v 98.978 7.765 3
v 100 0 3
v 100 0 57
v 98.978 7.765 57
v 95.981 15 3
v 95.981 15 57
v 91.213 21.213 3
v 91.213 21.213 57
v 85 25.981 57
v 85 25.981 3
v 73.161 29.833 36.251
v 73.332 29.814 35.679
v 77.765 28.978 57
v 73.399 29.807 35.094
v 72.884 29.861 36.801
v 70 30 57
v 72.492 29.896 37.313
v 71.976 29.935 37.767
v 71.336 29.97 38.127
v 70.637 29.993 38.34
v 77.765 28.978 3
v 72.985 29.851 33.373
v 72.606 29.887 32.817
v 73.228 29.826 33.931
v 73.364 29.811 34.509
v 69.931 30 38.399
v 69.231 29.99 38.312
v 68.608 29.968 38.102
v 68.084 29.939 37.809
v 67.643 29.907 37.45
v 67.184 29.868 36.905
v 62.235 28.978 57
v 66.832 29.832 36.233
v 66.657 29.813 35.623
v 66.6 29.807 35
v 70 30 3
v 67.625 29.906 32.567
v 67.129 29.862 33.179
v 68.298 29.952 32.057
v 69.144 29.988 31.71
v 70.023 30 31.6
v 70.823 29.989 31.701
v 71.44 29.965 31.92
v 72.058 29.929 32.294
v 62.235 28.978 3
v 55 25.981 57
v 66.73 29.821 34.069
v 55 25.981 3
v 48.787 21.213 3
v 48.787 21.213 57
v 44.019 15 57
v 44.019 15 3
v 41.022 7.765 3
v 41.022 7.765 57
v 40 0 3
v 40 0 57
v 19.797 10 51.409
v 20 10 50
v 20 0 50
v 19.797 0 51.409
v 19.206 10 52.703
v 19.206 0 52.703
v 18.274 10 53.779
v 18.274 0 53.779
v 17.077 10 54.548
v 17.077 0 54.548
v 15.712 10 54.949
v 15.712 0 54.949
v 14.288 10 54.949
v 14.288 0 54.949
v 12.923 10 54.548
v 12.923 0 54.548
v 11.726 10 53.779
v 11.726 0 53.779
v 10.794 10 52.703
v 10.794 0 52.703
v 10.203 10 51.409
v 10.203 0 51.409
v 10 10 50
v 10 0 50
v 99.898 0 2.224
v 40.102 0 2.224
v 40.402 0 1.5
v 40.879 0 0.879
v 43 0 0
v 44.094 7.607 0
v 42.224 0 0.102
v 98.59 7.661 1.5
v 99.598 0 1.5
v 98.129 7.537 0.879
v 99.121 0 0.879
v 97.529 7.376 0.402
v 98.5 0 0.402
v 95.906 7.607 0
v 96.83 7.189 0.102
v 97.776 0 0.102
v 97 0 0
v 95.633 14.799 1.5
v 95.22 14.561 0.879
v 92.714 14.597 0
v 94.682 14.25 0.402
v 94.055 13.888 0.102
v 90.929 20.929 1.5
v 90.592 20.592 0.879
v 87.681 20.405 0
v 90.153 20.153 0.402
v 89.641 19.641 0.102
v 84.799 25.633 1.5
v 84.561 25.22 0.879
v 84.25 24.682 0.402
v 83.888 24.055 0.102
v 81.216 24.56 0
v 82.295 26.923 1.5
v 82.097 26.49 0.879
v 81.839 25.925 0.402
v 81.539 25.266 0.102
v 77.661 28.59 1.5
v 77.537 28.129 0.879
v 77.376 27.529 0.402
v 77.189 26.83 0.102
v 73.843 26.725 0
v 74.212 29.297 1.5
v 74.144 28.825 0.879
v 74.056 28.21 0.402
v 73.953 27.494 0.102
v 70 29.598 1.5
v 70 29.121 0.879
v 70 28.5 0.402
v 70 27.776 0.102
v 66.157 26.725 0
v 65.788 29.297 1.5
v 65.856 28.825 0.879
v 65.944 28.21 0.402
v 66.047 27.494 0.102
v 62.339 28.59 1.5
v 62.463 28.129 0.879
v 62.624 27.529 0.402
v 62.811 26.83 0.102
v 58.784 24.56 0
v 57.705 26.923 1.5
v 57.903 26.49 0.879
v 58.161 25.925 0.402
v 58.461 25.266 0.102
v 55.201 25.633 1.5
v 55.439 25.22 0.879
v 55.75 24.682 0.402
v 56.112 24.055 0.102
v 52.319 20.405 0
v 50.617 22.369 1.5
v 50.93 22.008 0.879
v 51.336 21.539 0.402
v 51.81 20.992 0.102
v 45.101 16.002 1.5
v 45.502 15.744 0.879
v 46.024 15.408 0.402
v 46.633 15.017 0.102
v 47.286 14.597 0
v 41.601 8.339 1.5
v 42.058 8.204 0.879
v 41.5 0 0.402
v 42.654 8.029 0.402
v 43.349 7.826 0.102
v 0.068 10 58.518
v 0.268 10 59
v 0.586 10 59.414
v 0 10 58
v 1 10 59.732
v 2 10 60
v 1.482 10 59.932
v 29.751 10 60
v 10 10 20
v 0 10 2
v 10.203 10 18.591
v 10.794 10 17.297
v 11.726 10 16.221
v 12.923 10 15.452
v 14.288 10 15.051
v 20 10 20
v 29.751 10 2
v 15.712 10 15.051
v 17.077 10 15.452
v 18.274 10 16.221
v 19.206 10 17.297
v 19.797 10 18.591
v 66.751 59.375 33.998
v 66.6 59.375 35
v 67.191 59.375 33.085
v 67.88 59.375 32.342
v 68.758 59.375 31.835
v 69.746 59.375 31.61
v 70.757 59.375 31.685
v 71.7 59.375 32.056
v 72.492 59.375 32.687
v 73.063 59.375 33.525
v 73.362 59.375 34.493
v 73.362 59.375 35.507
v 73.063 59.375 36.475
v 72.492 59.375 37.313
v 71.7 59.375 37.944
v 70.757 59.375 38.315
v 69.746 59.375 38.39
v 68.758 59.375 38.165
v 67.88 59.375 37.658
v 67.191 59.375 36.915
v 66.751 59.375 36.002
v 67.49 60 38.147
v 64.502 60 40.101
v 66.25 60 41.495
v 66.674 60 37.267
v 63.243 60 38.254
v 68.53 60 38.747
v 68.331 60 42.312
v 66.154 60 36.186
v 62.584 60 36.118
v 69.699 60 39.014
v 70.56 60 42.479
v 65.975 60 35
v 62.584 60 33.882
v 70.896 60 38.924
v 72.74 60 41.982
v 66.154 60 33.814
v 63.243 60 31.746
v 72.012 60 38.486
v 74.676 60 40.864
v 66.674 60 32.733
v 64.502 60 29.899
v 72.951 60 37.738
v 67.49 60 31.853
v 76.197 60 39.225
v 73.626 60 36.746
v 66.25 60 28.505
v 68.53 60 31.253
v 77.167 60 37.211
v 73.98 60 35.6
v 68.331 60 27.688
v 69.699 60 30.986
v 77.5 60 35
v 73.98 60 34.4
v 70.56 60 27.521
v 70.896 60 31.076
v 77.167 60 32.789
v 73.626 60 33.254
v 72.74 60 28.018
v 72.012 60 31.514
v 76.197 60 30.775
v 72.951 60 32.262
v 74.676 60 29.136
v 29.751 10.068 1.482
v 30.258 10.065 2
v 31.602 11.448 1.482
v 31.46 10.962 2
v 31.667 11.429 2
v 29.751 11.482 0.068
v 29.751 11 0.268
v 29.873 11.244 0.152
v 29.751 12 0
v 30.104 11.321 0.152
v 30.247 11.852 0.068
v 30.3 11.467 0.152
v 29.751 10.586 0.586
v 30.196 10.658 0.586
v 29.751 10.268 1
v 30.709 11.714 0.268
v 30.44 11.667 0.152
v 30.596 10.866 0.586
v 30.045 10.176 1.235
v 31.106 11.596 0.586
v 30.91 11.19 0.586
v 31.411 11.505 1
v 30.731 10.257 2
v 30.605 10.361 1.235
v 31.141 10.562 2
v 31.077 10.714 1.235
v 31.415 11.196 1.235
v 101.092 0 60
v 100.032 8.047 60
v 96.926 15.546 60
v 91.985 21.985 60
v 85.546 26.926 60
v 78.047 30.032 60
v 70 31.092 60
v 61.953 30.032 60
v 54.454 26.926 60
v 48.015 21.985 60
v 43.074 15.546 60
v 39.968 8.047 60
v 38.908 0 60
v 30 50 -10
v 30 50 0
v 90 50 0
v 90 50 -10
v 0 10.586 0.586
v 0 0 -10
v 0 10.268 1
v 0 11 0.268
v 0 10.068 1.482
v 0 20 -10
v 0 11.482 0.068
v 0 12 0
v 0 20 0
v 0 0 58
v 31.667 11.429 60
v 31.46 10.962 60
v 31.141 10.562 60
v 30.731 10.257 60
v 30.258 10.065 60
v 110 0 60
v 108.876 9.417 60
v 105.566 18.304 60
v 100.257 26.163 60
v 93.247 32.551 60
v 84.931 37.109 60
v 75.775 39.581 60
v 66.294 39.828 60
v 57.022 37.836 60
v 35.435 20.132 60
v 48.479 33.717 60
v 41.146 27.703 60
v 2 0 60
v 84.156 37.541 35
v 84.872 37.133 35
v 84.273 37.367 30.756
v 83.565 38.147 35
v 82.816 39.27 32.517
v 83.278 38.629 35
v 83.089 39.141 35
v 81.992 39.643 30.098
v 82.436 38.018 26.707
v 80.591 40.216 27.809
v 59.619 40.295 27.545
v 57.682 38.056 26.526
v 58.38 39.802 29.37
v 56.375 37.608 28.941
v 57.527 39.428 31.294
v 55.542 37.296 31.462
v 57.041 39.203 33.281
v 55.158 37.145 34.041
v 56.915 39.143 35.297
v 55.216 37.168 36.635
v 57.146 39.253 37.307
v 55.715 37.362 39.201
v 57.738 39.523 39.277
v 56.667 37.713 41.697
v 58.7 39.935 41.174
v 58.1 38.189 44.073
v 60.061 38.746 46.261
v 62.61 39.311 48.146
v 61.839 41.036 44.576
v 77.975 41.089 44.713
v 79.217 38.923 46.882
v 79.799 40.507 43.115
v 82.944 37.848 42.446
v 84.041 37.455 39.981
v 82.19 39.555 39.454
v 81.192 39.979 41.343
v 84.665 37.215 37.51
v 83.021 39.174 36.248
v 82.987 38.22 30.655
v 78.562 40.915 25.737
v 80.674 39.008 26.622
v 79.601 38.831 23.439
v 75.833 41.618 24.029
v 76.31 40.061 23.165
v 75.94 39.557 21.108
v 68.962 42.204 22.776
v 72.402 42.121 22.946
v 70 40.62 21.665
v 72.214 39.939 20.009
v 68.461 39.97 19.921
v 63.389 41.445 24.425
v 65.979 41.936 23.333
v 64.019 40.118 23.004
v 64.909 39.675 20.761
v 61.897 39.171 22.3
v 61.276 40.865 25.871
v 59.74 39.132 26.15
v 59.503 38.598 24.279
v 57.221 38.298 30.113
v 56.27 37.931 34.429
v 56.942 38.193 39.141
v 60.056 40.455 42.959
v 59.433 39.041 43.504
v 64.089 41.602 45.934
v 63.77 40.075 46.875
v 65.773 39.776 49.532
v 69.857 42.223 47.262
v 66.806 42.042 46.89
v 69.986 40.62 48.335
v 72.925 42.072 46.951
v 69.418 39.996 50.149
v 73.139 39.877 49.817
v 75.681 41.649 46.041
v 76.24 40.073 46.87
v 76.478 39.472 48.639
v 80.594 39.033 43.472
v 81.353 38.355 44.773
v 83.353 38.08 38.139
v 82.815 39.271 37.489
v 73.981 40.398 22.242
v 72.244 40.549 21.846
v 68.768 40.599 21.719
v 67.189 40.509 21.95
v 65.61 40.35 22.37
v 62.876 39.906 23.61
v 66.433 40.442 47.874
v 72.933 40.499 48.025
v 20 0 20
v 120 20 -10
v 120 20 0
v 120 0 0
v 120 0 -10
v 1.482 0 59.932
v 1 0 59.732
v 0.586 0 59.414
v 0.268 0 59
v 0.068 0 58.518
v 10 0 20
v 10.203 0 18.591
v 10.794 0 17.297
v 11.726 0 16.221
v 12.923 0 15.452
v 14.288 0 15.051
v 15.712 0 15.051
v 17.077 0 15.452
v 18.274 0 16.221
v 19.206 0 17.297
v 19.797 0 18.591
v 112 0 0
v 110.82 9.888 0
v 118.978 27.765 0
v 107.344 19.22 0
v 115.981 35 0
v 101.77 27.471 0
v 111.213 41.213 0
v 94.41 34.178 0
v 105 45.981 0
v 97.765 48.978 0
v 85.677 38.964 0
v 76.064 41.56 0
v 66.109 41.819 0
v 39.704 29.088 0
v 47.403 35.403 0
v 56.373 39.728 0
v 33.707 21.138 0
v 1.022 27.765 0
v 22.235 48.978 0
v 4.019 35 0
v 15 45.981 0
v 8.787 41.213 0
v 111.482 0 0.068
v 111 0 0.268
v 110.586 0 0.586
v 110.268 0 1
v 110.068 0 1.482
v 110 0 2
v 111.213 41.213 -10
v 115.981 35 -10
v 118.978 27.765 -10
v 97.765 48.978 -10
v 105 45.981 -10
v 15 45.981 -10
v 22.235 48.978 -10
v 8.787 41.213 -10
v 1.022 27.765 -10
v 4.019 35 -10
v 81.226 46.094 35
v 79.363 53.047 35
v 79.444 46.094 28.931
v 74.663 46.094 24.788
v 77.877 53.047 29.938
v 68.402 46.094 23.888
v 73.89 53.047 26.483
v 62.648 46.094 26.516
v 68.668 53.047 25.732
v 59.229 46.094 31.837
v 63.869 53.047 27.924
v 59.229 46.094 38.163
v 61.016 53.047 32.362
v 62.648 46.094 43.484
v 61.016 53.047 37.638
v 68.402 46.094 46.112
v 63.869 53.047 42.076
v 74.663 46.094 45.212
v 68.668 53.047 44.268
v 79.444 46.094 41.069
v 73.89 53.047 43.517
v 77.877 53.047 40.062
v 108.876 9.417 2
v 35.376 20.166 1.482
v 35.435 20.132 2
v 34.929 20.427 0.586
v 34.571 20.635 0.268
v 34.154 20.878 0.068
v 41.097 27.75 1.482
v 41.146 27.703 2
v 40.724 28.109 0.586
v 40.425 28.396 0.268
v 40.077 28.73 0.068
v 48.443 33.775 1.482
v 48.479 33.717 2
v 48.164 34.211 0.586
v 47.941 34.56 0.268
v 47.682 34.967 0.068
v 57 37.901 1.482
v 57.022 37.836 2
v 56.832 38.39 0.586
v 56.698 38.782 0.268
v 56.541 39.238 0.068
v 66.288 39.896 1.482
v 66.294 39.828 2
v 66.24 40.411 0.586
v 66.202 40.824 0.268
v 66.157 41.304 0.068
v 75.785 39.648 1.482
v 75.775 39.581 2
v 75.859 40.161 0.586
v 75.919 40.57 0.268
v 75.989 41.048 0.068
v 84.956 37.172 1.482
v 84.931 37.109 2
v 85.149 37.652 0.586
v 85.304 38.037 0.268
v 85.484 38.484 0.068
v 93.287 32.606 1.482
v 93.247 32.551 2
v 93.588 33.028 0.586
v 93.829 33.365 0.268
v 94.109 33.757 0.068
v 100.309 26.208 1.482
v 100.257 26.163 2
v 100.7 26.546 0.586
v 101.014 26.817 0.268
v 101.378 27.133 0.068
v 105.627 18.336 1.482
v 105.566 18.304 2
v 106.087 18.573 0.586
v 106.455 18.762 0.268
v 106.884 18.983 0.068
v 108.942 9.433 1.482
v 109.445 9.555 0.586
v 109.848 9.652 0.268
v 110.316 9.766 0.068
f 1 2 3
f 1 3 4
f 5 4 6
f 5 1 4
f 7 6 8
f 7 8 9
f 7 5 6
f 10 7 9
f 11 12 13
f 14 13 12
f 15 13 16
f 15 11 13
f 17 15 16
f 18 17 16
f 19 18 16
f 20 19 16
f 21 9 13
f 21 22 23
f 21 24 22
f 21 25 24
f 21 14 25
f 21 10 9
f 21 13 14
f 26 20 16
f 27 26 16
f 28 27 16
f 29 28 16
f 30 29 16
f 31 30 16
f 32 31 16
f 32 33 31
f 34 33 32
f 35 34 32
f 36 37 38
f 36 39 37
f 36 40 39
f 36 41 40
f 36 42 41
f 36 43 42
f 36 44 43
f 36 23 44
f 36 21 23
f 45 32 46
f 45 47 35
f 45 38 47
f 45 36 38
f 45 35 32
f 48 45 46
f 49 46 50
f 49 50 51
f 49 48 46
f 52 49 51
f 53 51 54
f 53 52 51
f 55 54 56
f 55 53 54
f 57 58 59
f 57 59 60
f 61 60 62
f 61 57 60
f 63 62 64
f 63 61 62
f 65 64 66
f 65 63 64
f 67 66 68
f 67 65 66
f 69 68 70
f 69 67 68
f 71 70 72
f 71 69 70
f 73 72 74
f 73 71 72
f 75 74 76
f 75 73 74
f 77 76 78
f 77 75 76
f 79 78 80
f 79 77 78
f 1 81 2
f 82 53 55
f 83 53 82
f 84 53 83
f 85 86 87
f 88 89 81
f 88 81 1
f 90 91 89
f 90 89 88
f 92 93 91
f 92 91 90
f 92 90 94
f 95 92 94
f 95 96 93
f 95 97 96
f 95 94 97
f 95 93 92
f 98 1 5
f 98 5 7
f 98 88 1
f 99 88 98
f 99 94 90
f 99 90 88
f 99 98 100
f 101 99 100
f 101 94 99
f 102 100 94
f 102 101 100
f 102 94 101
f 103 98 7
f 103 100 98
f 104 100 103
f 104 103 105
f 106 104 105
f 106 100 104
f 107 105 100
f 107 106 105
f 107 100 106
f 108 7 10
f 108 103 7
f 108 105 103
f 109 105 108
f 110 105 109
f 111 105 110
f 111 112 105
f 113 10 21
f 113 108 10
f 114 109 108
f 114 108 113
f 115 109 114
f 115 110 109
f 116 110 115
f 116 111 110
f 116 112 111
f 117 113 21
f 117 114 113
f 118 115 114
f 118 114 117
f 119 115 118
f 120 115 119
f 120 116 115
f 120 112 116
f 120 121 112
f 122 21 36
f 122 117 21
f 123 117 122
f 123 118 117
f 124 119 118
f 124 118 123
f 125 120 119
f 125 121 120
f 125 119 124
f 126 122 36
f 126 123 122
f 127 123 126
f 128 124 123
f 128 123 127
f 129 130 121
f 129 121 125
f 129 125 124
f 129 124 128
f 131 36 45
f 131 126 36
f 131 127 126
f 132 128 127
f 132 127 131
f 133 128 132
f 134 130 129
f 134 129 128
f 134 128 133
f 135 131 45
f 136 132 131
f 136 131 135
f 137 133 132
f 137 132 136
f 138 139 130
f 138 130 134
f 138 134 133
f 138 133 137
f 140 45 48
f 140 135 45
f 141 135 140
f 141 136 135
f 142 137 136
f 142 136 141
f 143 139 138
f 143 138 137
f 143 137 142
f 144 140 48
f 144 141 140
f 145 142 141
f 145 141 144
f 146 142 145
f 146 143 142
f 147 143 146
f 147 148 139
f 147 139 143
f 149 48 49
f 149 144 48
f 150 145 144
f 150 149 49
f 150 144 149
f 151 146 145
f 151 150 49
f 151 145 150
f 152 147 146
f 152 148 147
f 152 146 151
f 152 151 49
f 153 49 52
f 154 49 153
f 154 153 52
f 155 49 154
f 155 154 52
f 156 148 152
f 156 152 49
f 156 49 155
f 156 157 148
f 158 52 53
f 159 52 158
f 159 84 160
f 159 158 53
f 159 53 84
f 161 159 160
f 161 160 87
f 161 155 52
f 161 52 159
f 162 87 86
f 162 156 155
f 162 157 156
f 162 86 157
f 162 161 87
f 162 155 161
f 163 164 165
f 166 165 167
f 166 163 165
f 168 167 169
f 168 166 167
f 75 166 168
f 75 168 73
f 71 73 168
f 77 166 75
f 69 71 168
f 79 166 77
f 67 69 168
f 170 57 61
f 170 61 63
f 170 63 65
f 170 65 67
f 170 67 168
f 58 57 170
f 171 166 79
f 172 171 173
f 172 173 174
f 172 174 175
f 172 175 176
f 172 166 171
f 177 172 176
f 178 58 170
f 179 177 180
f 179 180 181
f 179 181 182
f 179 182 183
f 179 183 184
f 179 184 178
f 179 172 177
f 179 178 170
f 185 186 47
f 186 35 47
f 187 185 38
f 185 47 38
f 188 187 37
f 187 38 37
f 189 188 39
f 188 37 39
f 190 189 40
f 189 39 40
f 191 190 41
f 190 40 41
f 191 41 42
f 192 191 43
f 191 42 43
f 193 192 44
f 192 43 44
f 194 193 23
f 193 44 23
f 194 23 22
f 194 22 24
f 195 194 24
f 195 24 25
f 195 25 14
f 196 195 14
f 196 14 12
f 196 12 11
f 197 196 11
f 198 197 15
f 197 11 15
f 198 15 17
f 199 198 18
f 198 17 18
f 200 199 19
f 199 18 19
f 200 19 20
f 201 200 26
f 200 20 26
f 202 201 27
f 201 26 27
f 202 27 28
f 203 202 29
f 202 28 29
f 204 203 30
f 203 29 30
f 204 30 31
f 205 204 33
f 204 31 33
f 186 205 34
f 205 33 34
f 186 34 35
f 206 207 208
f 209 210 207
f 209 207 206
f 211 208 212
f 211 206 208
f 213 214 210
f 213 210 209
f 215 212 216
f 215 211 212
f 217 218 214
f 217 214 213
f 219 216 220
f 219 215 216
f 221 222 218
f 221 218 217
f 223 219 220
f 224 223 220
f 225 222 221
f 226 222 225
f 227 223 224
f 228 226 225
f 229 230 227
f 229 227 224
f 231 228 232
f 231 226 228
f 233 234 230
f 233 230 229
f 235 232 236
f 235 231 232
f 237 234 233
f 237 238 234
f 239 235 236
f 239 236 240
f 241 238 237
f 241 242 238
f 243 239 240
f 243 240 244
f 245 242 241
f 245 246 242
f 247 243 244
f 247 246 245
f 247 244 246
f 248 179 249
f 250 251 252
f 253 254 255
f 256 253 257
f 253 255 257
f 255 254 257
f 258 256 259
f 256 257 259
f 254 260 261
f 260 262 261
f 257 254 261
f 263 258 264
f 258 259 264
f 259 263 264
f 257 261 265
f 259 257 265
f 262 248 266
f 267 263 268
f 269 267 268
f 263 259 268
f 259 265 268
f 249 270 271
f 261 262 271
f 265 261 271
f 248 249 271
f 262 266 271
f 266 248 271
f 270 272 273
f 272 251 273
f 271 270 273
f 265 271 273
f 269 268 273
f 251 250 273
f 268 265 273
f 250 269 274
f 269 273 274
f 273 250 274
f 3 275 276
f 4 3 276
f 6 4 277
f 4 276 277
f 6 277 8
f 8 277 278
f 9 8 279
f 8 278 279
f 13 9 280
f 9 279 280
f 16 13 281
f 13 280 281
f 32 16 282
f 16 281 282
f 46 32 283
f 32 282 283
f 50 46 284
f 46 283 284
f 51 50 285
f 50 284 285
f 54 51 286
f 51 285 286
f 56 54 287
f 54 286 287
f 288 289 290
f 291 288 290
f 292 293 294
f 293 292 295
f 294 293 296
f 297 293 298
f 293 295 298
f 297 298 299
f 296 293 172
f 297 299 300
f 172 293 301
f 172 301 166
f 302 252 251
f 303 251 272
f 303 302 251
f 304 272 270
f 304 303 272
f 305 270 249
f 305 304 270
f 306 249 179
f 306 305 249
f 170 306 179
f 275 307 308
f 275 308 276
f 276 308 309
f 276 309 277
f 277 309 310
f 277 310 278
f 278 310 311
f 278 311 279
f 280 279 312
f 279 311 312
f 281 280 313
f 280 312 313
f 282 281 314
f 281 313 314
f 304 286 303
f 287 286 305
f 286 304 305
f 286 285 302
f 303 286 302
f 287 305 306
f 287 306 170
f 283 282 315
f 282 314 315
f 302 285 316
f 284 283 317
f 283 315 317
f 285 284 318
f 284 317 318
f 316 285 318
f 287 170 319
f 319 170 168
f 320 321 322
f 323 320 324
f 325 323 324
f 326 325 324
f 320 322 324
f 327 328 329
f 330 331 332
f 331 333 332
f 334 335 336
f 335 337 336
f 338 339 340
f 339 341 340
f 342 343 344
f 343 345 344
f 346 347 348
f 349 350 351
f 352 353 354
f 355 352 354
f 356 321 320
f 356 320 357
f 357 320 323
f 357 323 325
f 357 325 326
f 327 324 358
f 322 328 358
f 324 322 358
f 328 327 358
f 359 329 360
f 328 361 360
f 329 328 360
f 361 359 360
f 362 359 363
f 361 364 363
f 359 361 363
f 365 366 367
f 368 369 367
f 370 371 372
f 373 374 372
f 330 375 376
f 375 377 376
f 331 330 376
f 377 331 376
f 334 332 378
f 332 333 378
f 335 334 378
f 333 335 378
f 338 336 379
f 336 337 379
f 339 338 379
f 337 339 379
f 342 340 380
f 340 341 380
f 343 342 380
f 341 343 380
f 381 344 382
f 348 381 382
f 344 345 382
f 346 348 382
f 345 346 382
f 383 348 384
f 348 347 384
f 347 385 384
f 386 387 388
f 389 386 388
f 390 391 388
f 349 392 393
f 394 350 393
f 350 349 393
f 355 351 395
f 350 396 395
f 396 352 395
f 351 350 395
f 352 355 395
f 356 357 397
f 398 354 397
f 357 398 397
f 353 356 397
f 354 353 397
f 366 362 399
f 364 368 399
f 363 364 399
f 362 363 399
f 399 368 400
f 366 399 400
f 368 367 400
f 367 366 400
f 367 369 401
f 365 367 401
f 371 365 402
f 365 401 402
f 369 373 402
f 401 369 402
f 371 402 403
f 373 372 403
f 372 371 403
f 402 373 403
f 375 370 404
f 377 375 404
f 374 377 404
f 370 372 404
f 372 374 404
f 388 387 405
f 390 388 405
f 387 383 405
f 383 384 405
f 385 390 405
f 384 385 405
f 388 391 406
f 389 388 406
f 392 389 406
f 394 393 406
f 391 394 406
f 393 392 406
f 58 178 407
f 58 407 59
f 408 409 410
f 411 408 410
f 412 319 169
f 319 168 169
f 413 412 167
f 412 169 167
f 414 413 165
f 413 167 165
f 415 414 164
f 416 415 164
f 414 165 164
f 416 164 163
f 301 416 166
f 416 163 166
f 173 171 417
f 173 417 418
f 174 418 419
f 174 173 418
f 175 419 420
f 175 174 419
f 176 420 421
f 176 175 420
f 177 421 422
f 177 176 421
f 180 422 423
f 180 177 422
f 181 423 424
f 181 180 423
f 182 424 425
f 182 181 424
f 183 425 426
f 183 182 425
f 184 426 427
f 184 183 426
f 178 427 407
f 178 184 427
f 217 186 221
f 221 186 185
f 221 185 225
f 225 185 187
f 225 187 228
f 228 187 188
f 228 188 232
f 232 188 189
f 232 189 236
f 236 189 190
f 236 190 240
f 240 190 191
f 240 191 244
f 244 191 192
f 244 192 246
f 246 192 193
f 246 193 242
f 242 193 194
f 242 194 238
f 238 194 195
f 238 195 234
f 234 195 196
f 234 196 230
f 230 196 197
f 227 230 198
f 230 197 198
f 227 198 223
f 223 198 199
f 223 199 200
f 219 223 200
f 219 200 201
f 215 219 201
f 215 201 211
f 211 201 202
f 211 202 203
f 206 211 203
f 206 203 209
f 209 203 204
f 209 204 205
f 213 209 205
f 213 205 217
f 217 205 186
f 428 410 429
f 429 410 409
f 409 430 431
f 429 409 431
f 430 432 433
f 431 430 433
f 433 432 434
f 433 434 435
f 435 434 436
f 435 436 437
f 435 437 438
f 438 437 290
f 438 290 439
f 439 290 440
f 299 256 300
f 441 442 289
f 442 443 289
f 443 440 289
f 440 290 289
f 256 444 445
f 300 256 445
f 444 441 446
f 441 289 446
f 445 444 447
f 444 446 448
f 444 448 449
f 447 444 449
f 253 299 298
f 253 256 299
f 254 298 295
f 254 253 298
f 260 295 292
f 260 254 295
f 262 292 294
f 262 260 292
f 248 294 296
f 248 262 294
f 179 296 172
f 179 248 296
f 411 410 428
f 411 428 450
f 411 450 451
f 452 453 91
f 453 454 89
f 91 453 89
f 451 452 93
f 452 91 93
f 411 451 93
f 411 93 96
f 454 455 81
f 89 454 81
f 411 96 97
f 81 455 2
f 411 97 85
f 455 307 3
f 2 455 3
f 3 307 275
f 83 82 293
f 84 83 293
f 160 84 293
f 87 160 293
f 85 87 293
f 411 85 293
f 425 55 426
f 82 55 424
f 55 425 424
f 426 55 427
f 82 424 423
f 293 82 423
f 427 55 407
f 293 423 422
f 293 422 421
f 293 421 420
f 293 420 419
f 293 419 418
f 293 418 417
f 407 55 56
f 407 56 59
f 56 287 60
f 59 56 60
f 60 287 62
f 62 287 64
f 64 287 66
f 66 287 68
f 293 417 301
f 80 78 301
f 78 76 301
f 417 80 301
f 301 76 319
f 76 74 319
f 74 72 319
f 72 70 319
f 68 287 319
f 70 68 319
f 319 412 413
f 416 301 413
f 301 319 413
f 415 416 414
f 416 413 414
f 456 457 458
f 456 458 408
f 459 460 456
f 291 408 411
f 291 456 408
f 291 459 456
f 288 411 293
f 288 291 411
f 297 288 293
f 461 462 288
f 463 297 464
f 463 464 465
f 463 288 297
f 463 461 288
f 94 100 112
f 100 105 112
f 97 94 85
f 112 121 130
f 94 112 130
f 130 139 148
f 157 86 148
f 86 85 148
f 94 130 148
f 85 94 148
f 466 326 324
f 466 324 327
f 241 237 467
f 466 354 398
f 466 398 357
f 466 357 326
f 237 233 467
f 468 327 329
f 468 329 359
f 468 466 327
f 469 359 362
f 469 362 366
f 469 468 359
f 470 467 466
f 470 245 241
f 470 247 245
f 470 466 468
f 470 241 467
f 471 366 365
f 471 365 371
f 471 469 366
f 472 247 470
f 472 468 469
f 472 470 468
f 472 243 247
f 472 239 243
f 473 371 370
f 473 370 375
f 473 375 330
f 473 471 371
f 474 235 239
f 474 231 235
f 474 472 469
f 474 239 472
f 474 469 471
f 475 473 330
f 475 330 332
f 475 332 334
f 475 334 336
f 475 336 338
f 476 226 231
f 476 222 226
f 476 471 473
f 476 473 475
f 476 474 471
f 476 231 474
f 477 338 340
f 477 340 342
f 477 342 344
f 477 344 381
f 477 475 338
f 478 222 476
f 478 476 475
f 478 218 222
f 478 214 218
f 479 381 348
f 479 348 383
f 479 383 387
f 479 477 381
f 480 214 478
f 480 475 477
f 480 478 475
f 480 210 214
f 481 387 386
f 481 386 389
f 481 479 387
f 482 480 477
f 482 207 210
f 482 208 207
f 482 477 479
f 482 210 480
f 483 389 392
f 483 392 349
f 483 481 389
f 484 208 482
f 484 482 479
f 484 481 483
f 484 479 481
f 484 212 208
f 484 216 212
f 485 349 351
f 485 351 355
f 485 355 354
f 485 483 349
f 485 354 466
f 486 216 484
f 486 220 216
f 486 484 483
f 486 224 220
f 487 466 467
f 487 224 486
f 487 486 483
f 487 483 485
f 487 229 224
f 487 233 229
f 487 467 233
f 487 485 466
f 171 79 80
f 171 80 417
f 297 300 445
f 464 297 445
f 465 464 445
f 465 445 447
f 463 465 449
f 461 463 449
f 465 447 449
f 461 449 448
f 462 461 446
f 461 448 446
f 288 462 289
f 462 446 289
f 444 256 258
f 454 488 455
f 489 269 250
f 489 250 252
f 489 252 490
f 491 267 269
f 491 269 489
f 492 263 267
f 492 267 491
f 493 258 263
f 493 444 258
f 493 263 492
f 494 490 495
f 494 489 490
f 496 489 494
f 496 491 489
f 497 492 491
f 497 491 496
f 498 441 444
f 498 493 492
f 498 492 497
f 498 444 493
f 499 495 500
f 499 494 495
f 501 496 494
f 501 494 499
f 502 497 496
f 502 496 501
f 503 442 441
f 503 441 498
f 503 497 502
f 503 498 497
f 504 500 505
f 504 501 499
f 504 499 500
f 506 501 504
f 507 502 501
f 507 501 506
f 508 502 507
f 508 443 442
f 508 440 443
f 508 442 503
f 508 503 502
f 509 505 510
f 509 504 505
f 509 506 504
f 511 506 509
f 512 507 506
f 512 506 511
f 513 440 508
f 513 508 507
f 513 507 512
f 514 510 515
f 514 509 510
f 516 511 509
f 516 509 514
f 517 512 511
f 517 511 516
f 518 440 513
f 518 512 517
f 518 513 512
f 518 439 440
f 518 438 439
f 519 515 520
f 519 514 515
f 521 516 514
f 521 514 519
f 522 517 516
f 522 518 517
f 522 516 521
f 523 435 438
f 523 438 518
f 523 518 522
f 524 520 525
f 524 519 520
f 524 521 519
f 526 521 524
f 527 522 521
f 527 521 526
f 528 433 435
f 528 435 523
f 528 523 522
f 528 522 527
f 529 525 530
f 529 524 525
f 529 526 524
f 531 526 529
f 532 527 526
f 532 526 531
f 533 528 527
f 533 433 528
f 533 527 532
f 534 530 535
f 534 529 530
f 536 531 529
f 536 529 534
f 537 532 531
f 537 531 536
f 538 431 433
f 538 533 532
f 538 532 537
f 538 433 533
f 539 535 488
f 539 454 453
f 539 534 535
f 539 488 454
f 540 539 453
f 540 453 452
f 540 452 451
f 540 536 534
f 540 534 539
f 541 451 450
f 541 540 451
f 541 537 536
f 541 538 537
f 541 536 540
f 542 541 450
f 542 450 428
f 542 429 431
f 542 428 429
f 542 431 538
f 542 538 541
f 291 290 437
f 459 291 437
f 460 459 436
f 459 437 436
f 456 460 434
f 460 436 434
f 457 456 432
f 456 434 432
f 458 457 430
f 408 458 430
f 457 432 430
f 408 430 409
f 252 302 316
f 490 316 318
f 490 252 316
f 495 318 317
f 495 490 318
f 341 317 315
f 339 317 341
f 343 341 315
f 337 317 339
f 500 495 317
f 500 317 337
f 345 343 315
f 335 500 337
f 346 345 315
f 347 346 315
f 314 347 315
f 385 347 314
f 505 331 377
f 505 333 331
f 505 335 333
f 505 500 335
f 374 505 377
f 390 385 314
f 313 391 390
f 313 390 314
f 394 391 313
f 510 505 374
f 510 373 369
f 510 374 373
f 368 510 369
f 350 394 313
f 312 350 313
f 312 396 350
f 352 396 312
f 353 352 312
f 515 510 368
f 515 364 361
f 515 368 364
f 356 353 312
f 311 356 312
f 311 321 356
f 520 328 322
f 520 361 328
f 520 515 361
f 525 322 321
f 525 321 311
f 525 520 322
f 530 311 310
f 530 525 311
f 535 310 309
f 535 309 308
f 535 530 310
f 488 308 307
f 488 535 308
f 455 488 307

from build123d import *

# Parameters (mm, degrees)
P_IDAT_VYSUNUT_M1_DEPTH  = 60
ODEBRAT_VYSUNUT_M1_REACH = 130.841
P_IDAT_VYSUNUT_M2_DEPTH  = 10
M8_Z_VIT1_D              = 6.8
M8_Z_VIT1_CSINK_D        = 8.05
M8_Z_VIT1_CSINK_ANGLE    = 90
ZAOBLIT1_R               = 2
ZAOBLIT2_R               = 3
ZKOSEN_1_SIZE            = 3
ZKOSEN_1_SIZE2           = 1.091910703


# Read off the part's stored shape, not the designer's step: Přidat vysunutím3
with BuildPart() as part:
    # Skica1 → Přidat vysunutím1 (new body)
    with BuildSketch(Plane.XY):
        with BuildLine():
            Line((0, 0), (0, 10))
            Line((0, 10), (31.270166538, 10))
            ThreePointArc((31.270166538, 10), (75.040171699, 39.681187851), (110, 0))
            Line((110, 0), (100, 0))
            ThreePointArc((100, 0), (70, 30), (40, 0))
            Line((40, 0), (0, 0))
        make_face()
    extrude(amount=P_IDAT_VYSUNUT_M1_DEPTH)

    # Skica2 → Odebrat vysunutím1 (cut, up to next)
    with BuildSketch(Plane(origin=(0, 10, 0), x_dir=(1, 0, 0), z_dir=(0, 1, 0)), mode=Mode.PRIVATE) as odebrat_vysunut_m1_sk1:
        with BuildLine():
            Line((20, -20), (20, -50))
            ThreePointArc((20, -50), (15, -55), (10, -50))
            Line((10, -50), (10, -20))
            ThreePointArc((10, -20), (15, -15), (20, -20))
        make_face()
    odebrat_vysunut_m1_tool1 = extrude(odebrat_vysunut_m1_sk1.sketch, amount=-ODEBRAT_VYSUNUT_M1_REACH, mode=Mode.PRIVATE) & part.part
    add(odebrat_vysunut_m1_tool1.solids().sort_by_distance((15, 10, 35))[0], mode=Mode.SUBTRACT)

    # Skica3 → Přidat vysunutím2 (add)
    with BuildSketch(Plane(origin=(0, 0, 0), x_dir=(-1, 0, 0), z_dir=(0, 0, -1))):
        with BuildLine():
            Line((0, 0), (0, 20))
            ThreePointArc((0, 20), (-8.786796564, 41.213203436), (-30, 50))
            Line((-30, 50), (-90, 50))
            ThreePointArc((-90, 50), (-111.213203436, 41.213203436), (-120, 20))
            Line((-120, 20), (-120, 0))
            Line((-120, 0), (0, 0))
        make_face()
    extrude(amount=P_IDAT_VYSUNUT_M2_DEPTH)

    # Přidat vysunutím3 outline → Přidat vysunutím3 (revolve)
    with BuildSketch(Plane(origin=(70, 0, 35), x_dir=(1, 0, 0), z_dir=(0, 0, 1))):
        Polygon((7.5, 60), (0, 60), (0, 37.657552573), (13.486640745, 37.657552573), align=None)
    revolve(axis=Axis((70, 0, 35), (0, 1, 0)))

    # M8 závit1 (through all)
    with Locations(Plane(origin=(0, 60, 0), x_dir=(1, 0, 0), z_dir=(0, 1, 0))):
        with Locations((70, -35)):
            CounterSinkHole(M8_Z_VIT1_D / 2, M8_Z_VIT1_CSINK_D / 2, counter_sink_angle=M8_Z_VIT1_CSINK_ANGLE)

    # Zaoblit1
    zaoblit1_edges = [part.edges().sort_by_distance(p)[0] for p in [
        (31.270166538, 10, 30),
        (0, 5, 60),
        (15.635083269, 10, 0),
        (75.040171699, 39.681187851, 0),
    ]]
    fillet(zaoblit1_edges, radius=ZAOBLIT1_R)

    # Zaoblit2
    zaoblit2_edges = [part.edges().sort_by_distance(p)[0] for p in [
        (56.513435034, 37.657835378, 35.000000009),
        (70, 30, 0),
    ]]
    fillet(zaoblit2_edges, radius=ZAOBLIT2_R)

    # Zkosení1
    zkosen_1_edges = [part.edges().sort_by_distance(p)[0] for p in [
        (70, 30, 60),
    ]]
    zkosen_1_side = [part.faces().sort_by_distance(p)[0] for p in [
        (70, 30, 31.5),
    ]]
    chamfer(zkosen_1_edges, length=ZKOSEN_1_SIZE, length2=ZKOSEN_1_SIZE2, reference=zkosen_1_side[0])


solid = part.part
